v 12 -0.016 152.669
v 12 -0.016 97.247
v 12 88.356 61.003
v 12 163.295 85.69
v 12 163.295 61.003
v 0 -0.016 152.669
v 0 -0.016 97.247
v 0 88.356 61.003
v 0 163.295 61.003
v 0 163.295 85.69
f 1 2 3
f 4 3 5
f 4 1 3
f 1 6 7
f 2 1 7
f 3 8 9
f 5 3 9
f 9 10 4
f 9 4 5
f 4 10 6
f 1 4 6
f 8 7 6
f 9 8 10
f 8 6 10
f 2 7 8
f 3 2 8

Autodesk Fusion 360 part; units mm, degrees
sketch "Name Sign Support" plane through (0, 0, 0) normal (1, 0, 0) x (0, 1, 0) in component "Name Sign Support (1)"
  line L0 (-0.0158, 97.2466) -> (88.3556, 61.0028)
  line L1 (163.2949, 85.69) -> (-0.0158, 152.6686)
  line L2 (-0.0158, 152.6686) -> (-0.0158, 97.2466)
  line L3 (163.2949, 85.69) -> (163.2949, 61.0028)
  line L4 (88.3556, 61.0028) -> (163.2949, 61.0028)
  dimension "d18" = 67.7
  dimension "d9" = 55.422
  dimension "d2" = 176.512
  dimension "d3" = 95.515
extrude "Extrude2" add sketch "Name Sign Support" along normal blind 12 in component "Name Sign Support (1)"
component "Name Sign Support Left" placed x (1, 0, 0) y (0, 1, 0) z (0, 0, 1) at (0, 0, 0)
component "Name Sign Support" placed x (1, 0, 0) y (0, 1, 0) z (0, 0, 1) at (0, 0, 0) in component "Name Sign Support Left"
component "Name Sign Support (1)" placed x (1, 0, 0) y (0, 1, 0) z (0, 0, 1) at (0, 0, 0) in component "Name Sign Support"
equation "d19 = pineThickness"
equation "pineThickness = 12 mm" comment "Thickness of the pine planks"
